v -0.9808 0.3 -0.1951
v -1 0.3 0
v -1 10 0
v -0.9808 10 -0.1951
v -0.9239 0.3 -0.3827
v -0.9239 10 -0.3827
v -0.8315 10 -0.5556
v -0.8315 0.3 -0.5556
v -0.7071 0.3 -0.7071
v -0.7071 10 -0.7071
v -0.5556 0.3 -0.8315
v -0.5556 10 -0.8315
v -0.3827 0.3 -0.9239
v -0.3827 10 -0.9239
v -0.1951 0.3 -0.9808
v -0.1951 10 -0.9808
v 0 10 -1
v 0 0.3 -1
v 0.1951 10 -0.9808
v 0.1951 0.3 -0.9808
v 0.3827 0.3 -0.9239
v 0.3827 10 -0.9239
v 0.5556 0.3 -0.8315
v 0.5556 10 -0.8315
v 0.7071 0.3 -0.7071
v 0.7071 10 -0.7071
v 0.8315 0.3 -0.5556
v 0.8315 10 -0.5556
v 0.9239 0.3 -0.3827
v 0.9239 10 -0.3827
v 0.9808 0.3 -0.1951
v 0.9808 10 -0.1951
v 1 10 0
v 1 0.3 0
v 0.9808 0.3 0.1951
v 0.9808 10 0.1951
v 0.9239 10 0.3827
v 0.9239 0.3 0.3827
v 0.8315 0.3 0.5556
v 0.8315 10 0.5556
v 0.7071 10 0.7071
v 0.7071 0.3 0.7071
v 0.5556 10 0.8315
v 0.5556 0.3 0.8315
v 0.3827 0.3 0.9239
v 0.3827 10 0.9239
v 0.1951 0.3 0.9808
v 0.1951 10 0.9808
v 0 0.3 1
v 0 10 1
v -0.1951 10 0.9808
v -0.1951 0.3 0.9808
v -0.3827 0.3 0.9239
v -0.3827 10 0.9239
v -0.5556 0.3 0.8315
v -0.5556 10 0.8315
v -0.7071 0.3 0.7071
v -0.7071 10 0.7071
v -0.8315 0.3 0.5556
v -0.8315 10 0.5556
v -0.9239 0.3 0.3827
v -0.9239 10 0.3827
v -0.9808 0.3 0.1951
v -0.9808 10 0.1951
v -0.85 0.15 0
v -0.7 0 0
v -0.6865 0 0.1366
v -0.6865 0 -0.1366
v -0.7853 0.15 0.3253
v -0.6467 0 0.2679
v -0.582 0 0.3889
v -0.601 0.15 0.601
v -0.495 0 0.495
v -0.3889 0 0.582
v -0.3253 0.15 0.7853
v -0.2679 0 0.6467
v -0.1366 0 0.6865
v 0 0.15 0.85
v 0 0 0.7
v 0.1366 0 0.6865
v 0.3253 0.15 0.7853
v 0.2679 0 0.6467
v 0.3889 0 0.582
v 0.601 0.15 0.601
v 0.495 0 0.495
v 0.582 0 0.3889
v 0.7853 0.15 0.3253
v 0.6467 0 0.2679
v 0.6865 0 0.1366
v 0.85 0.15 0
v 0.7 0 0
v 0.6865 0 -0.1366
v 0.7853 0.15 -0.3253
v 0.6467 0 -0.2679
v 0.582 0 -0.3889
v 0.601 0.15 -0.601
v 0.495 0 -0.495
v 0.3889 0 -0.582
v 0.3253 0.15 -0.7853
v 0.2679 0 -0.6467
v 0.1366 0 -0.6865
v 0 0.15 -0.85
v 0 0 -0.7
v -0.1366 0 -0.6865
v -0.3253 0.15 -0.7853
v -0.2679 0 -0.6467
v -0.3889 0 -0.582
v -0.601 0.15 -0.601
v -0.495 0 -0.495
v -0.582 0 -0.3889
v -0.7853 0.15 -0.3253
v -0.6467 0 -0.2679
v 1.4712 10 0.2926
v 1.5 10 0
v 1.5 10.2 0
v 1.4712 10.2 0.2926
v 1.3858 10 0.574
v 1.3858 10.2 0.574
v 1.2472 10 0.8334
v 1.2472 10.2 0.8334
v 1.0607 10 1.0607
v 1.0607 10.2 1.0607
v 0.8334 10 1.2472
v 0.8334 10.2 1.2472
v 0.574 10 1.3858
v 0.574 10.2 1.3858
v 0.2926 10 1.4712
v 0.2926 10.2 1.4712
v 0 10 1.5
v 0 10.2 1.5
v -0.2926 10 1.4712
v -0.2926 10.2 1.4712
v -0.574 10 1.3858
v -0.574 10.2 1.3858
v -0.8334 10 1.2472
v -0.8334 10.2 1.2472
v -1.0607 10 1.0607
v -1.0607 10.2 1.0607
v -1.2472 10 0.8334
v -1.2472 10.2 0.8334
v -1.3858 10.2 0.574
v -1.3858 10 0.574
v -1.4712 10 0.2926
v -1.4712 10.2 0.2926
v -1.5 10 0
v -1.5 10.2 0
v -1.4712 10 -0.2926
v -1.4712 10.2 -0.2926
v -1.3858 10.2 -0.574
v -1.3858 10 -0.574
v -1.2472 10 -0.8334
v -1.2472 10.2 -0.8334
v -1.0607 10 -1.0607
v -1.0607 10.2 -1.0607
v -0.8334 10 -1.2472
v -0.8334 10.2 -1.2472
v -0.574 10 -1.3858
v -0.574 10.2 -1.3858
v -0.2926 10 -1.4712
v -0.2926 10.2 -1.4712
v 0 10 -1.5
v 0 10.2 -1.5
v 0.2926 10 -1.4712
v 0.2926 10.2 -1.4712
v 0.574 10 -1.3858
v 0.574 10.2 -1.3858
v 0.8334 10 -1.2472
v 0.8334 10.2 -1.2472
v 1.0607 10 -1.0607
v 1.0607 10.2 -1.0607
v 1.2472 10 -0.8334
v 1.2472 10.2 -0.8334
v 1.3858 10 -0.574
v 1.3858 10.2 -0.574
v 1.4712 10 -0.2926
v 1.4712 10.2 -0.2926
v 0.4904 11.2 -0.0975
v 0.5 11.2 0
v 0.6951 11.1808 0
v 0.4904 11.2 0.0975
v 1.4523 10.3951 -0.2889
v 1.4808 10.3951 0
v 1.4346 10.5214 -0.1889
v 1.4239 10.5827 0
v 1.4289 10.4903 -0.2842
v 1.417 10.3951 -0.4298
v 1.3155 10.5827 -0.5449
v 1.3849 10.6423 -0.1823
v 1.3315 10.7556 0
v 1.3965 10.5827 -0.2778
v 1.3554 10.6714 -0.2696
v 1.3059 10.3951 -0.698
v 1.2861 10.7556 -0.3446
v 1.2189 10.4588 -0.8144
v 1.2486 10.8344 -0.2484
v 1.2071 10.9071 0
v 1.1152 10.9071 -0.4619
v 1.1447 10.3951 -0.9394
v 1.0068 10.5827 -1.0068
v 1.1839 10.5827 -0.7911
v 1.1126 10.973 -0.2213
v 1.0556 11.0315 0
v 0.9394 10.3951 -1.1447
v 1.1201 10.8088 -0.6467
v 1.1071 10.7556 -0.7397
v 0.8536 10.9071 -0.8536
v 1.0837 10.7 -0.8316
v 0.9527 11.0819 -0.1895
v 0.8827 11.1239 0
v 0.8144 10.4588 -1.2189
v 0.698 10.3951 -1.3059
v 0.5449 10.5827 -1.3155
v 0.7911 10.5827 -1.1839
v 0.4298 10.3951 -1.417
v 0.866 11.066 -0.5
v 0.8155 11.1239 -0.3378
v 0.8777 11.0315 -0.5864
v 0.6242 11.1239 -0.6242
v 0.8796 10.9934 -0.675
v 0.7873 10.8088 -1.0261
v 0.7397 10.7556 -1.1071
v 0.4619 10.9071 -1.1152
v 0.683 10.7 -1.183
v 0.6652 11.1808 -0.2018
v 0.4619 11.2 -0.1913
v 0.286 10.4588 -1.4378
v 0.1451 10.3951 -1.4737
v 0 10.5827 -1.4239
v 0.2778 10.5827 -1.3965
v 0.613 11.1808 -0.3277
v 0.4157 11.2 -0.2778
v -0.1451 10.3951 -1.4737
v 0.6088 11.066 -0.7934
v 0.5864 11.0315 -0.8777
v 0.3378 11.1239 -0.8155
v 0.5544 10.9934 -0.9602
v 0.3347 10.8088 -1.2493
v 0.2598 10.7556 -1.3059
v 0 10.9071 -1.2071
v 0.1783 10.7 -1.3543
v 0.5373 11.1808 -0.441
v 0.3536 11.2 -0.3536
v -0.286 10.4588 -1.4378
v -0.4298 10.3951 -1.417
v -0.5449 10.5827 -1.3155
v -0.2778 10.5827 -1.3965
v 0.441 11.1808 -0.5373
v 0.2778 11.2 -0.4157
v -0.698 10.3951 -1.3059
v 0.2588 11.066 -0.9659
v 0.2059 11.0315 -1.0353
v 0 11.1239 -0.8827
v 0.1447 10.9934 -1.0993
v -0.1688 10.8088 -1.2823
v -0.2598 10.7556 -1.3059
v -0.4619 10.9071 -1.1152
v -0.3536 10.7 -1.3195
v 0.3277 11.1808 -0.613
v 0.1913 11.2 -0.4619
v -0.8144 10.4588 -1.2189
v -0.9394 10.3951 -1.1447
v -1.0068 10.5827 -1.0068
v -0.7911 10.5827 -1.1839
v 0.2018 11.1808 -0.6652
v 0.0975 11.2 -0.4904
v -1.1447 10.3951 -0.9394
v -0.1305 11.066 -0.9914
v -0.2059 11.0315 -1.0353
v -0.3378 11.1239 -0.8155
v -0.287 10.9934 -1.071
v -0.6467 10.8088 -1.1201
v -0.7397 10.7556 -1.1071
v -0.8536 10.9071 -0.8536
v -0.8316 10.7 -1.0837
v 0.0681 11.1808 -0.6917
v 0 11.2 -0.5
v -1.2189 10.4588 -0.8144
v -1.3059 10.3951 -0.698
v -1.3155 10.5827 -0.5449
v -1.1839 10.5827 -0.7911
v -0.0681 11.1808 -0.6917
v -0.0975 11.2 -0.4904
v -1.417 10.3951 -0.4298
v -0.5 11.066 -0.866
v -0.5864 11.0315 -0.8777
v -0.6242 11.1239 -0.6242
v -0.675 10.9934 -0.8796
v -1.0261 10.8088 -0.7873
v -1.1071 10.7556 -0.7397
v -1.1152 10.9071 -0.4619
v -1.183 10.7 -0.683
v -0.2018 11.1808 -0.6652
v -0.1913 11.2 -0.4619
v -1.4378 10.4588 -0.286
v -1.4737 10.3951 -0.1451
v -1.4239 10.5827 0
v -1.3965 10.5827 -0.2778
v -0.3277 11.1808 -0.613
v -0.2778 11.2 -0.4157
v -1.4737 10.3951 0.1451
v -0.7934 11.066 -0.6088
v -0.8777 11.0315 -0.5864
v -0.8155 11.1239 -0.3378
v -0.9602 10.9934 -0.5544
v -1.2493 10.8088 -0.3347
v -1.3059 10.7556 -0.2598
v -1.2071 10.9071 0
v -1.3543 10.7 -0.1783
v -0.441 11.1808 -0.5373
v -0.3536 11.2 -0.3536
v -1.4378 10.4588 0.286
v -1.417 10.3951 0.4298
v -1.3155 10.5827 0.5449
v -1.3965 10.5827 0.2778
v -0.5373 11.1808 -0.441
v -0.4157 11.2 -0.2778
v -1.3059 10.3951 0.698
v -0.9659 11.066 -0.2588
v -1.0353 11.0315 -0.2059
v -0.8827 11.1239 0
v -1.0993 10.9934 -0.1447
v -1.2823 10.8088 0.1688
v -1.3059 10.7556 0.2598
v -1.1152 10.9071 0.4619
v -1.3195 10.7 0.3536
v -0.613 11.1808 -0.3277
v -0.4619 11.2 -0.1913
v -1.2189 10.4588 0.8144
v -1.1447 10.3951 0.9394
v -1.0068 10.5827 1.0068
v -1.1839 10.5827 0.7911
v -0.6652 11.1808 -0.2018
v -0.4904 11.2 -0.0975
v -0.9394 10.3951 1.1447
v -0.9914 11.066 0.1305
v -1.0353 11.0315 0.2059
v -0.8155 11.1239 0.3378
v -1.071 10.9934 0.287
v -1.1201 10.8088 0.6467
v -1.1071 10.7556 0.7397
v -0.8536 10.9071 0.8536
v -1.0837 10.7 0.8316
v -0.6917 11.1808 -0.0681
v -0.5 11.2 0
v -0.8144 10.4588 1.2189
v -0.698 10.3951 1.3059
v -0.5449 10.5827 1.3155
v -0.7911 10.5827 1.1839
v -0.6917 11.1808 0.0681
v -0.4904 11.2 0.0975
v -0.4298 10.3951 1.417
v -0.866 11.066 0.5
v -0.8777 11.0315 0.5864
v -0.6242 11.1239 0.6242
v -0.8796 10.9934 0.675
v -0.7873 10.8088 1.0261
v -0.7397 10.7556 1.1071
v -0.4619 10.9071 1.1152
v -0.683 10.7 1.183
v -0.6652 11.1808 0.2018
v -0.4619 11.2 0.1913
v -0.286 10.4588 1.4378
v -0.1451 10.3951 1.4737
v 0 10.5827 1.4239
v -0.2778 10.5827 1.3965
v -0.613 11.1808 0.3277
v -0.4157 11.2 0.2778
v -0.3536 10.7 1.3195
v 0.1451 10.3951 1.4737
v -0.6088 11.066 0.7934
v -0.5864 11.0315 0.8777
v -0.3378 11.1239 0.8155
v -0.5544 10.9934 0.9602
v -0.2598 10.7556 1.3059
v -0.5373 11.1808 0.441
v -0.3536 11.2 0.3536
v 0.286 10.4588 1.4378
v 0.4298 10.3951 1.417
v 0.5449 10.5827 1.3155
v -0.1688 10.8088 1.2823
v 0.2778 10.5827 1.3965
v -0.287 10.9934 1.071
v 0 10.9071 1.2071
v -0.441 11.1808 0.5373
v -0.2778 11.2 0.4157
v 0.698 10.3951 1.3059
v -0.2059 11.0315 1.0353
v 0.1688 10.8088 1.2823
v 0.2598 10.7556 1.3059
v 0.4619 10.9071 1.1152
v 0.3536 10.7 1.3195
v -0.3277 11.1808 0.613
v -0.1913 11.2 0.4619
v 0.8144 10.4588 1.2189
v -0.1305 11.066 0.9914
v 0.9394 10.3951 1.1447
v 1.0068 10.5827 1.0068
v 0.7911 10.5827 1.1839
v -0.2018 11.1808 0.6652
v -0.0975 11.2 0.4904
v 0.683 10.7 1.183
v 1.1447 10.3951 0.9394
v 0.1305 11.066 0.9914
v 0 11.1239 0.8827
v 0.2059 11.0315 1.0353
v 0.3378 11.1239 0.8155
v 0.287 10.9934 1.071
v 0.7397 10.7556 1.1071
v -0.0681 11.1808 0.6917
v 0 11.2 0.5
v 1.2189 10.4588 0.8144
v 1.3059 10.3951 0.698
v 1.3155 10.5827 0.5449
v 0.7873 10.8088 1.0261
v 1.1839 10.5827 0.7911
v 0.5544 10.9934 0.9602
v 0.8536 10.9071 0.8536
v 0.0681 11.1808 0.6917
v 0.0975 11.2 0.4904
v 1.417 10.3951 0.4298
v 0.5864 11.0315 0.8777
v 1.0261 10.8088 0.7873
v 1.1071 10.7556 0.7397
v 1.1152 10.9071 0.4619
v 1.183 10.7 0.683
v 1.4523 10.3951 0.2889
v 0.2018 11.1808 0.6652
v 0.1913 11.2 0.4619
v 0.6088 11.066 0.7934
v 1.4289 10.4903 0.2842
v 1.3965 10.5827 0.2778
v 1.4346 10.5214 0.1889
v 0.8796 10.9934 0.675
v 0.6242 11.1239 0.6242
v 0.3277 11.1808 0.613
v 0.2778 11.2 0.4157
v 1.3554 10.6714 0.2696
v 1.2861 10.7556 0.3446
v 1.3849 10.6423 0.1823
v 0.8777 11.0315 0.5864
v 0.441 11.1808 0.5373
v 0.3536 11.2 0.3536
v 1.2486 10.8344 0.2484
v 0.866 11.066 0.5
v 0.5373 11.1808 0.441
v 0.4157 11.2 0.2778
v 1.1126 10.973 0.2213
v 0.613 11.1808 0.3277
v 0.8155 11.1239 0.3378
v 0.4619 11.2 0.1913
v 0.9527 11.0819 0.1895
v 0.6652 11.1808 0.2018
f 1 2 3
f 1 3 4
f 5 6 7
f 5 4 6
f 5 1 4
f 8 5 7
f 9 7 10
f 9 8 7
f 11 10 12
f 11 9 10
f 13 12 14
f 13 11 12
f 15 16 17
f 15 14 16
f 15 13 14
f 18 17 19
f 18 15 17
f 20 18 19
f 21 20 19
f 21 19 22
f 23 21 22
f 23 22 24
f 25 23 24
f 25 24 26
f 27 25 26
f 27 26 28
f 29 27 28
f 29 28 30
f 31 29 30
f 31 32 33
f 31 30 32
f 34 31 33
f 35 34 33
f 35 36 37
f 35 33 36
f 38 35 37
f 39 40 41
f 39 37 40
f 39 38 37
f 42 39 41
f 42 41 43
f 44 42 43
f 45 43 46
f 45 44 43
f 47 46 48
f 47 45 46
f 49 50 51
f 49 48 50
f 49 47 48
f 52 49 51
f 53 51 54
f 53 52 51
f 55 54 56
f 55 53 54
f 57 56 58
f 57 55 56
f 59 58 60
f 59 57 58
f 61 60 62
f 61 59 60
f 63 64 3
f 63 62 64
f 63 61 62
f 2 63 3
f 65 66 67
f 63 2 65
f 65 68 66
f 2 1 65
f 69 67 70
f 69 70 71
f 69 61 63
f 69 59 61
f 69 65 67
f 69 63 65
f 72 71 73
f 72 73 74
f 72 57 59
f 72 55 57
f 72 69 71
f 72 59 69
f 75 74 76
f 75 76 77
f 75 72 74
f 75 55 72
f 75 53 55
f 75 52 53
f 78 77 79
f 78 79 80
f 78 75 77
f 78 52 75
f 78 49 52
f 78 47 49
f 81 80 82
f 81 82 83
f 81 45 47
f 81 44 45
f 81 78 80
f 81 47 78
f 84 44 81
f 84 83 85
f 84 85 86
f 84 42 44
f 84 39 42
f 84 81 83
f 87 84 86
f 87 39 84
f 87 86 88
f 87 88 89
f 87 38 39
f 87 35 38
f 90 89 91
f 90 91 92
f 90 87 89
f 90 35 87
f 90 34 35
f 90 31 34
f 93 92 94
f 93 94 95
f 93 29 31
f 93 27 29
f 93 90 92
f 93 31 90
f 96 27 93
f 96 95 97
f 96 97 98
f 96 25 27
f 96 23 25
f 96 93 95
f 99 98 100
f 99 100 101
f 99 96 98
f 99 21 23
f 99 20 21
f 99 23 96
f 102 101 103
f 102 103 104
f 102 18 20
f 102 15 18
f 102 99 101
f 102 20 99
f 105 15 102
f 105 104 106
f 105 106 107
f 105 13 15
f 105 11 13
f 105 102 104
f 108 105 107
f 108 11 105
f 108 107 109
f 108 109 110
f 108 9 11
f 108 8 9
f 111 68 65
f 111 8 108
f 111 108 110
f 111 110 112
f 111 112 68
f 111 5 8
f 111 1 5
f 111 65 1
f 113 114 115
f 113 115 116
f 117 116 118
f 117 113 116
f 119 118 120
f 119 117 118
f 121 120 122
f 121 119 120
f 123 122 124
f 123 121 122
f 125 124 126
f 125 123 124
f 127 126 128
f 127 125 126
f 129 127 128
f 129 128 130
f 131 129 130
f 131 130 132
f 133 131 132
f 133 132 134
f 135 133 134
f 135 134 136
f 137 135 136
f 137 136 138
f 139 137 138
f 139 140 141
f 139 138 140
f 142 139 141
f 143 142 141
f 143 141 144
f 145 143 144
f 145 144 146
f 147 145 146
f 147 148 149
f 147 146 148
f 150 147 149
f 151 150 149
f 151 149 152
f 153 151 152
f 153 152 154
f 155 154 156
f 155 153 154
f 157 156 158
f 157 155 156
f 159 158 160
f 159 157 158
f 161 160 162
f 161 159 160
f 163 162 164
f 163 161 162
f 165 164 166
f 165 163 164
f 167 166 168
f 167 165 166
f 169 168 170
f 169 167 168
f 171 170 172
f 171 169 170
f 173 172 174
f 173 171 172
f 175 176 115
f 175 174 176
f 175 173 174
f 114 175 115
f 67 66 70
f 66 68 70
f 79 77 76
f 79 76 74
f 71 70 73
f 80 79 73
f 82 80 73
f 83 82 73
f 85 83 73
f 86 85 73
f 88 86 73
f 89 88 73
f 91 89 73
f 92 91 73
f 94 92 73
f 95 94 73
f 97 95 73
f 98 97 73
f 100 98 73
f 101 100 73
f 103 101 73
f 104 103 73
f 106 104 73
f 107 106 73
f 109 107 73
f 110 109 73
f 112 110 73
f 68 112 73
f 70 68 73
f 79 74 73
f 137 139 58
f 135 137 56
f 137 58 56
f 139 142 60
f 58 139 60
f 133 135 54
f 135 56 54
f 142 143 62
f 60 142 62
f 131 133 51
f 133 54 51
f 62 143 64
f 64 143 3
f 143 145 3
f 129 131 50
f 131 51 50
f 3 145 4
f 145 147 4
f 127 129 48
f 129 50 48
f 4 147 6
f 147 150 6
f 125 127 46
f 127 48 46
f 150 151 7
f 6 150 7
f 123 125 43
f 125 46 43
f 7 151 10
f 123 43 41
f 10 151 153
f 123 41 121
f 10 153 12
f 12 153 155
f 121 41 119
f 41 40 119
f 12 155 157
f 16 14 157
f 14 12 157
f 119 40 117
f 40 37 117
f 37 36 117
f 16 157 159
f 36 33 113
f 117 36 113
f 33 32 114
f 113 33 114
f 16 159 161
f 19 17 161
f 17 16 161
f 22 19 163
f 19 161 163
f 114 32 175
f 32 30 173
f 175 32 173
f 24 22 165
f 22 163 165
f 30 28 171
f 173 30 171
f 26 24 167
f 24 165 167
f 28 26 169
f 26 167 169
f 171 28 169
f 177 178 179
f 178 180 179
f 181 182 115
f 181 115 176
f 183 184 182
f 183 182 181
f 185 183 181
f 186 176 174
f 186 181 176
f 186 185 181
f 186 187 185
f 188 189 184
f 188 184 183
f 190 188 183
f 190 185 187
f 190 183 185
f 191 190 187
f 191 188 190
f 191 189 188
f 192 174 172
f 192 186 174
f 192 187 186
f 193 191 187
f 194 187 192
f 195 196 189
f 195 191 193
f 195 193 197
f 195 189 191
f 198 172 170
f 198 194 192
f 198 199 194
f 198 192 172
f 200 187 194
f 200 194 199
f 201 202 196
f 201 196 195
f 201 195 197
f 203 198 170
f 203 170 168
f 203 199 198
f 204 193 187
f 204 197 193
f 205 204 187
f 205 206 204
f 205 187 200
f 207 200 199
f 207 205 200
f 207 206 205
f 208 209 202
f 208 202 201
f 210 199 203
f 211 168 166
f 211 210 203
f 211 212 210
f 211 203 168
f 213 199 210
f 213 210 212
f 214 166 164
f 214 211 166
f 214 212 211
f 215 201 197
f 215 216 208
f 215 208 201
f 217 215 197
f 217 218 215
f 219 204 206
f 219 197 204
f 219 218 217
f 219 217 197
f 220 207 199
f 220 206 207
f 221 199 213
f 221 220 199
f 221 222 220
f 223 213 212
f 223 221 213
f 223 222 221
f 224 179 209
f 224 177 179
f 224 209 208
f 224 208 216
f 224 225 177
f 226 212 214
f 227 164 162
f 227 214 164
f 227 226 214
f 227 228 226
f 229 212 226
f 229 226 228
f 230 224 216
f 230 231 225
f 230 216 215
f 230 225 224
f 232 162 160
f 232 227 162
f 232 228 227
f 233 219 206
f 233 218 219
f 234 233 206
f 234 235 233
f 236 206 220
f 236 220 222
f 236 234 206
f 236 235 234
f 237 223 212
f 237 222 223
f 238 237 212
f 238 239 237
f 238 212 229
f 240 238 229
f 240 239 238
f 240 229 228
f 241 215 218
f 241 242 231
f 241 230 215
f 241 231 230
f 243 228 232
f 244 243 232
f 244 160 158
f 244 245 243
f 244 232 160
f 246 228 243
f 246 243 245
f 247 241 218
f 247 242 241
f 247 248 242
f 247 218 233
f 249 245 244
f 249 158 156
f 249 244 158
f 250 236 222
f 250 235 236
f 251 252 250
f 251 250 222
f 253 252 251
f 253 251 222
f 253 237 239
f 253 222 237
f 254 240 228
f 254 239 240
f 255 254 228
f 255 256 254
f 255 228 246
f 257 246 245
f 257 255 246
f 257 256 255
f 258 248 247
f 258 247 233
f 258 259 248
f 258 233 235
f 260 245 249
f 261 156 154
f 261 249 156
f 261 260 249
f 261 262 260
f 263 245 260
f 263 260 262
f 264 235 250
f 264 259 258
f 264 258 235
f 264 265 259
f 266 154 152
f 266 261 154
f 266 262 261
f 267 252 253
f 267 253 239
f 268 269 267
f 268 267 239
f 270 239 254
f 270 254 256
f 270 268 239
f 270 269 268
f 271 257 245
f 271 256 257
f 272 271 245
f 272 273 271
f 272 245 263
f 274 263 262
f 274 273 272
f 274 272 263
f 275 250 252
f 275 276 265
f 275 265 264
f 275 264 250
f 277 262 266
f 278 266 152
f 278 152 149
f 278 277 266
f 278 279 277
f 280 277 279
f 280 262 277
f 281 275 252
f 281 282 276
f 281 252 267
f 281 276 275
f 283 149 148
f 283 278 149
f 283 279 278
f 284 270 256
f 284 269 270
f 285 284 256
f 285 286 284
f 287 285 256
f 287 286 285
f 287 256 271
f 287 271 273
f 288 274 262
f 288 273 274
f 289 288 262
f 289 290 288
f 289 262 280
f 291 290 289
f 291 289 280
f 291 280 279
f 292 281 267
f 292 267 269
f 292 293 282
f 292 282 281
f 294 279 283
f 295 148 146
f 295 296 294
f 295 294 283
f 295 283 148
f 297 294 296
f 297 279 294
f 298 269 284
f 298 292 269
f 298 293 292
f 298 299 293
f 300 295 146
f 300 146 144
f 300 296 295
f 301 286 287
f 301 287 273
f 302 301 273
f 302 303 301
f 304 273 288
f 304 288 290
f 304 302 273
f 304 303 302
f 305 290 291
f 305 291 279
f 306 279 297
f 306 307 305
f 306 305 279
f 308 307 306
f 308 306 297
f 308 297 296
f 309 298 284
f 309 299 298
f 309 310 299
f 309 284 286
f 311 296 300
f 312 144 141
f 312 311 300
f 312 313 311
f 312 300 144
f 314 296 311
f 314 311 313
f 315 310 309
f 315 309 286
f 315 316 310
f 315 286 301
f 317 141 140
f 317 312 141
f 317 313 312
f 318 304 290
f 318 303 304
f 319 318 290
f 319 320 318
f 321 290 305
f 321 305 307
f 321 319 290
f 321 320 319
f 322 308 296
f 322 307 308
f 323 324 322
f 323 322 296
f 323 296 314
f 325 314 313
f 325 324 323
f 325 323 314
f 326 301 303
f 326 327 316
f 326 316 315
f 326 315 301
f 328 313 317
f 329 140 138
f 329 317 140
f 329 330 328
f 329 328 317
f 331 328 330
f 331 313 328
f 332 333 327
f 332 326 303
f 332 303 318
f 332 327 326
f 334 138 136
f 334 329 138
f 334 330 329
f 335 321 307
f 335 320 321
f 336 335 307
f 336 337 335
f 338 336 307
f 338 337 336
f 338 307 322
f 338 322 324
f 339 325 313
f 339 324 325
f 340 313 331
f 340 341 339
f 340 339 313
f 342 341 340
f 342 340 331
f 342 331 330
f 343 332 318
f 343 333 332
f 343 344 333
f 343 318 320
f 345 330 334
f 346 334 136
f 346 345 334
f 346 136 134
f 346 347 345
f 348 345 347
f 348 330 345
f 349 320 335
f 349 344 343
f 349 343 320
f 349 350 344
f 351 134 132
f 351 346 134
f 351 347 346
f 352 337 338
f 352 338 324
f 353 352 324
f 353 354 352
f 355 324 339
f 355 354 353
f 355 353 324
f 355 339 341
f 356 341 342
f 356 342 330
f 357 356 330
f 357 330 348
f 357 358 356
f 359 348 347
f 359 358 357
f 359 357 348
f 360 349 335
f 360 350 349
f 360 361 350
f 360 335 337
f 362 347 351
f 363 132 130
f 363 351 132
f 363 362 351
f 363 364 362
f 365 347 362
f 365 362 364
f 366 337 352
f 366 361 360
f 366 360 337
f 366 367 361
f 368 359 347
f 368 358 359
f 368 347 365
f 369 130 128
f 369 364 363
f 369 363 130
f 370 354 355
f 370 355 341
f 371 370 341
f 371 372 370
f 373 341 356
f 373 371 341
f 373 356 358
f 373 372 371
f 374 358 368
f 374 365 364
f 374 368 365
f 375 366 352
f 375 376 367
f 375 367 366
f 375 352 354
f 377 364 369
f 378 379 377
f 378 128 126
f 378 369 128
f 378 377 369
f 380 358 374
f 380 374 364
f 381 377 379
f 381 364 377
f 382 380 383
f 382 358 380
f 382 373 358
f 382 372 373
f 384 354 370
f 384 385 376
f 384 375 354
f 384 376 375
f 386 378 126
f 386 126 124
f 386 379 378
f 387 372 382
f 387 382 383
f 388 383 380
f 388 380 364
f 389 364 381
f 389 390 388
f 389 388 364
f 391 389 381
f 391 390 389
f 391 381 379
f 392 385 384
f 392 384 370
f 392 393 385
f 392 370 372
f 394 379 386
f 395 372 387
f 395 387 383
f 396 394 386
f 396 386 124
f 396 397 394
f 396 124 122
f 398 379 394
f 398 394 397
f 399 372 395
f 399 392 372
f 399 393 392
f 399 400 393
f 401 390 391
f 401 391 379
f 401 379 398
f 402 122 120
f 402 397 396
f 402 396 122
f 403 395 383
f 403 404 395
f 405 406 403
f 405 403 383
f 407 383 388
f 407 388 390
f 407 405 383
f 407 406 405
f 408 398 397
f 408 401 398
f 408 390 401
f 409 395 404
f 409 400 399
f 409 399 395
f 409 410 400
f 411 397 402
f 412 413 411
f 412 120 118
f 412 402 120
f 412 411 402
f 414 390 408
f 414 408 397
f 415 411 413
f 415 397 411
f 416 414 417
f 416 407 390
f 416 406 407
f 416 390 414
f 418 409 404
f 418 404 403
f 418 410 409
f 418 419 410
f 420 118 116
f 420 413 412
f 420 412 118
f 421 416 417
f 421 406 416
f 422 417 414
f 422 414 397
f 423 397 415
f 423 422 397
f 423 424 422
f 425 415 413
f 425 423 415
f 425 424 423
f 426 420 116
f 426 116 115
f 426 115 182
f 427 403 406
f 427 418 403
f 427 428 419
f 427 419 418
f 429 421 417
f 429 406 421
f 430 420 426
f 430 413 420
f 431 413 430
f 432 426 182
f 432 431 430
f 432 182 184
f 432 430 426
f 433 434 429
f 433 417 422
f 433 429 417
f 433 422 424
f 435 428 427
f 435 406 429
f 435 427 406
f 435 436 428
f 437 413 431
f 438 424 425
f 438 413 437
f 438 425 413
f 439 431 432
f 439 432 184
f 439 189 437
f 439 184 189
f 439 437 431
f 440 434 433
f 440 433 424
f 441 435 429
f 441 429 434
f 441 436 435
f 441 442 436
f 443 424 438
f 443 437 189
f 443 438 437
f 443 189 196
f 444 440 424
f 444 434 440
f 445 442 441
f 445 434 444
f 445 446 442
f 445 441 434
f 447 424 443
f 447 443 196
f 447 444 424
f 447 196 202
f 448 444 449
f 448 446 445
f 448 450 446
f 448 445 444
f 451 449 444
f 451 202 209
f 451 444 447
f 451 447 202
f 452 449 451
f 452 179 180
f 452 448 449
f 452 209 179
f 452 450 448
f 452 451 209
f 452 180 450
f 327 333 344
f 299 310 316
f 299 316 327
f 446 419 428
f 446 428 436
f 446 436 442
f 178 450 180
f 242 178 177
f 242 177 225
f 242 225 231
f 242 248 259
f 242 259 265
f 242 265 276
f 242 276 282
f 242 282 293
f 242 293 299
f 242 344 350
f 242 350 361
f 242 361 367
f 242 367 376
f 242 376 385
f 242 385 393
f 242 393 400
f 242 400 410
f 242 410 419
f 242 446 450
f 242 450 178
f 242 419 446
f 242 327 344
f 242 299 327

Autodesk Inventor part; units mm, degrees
ref_plane "YZ Plane" through (0, 0, 0) normal (1, 0, 0) x (0, 1, 0)
ref_plane "XZ Plane" through (0, 0, 0) normal (0, 1, 0) x (-1, 0, 0)
ref_plane "XY Plane" through (0, 0, 0) normal (0, 0, 1) x (1, 0, 0)
sketch "Sketch1" plane through (0, 0, 0) normal (0, 1, 0) x (-1, 0, 0)
  circle A0 centre (0, 0) radius 1
  dimension "d0" = 2
extrude "Extrusion1" add sketch "Sketch1" along normal blind 10
sketch "Sketch2" plane through (0, 10, 0) normal (0, 1, 0) x (1, 0, 0)
  circle A0 centre (0, 0) radius 1.5
  dimension "d3" = 3
extrude "Extrusion2" add sketch "Sketch2" along normal blind 1.2
fillet "Fillet1" radius 1 1 edges at (-1.5, 11.2, 0)
chamfer "Chamfer1" distance 0.3 angle 45 1 edges at (1, 0, 0)
thread "Thread1" size "M2x0.4" class "6g" standard "ANSI Metric M Profile" full length
properties part number "M2x10 Screw Steel" material "Nylon 6"
